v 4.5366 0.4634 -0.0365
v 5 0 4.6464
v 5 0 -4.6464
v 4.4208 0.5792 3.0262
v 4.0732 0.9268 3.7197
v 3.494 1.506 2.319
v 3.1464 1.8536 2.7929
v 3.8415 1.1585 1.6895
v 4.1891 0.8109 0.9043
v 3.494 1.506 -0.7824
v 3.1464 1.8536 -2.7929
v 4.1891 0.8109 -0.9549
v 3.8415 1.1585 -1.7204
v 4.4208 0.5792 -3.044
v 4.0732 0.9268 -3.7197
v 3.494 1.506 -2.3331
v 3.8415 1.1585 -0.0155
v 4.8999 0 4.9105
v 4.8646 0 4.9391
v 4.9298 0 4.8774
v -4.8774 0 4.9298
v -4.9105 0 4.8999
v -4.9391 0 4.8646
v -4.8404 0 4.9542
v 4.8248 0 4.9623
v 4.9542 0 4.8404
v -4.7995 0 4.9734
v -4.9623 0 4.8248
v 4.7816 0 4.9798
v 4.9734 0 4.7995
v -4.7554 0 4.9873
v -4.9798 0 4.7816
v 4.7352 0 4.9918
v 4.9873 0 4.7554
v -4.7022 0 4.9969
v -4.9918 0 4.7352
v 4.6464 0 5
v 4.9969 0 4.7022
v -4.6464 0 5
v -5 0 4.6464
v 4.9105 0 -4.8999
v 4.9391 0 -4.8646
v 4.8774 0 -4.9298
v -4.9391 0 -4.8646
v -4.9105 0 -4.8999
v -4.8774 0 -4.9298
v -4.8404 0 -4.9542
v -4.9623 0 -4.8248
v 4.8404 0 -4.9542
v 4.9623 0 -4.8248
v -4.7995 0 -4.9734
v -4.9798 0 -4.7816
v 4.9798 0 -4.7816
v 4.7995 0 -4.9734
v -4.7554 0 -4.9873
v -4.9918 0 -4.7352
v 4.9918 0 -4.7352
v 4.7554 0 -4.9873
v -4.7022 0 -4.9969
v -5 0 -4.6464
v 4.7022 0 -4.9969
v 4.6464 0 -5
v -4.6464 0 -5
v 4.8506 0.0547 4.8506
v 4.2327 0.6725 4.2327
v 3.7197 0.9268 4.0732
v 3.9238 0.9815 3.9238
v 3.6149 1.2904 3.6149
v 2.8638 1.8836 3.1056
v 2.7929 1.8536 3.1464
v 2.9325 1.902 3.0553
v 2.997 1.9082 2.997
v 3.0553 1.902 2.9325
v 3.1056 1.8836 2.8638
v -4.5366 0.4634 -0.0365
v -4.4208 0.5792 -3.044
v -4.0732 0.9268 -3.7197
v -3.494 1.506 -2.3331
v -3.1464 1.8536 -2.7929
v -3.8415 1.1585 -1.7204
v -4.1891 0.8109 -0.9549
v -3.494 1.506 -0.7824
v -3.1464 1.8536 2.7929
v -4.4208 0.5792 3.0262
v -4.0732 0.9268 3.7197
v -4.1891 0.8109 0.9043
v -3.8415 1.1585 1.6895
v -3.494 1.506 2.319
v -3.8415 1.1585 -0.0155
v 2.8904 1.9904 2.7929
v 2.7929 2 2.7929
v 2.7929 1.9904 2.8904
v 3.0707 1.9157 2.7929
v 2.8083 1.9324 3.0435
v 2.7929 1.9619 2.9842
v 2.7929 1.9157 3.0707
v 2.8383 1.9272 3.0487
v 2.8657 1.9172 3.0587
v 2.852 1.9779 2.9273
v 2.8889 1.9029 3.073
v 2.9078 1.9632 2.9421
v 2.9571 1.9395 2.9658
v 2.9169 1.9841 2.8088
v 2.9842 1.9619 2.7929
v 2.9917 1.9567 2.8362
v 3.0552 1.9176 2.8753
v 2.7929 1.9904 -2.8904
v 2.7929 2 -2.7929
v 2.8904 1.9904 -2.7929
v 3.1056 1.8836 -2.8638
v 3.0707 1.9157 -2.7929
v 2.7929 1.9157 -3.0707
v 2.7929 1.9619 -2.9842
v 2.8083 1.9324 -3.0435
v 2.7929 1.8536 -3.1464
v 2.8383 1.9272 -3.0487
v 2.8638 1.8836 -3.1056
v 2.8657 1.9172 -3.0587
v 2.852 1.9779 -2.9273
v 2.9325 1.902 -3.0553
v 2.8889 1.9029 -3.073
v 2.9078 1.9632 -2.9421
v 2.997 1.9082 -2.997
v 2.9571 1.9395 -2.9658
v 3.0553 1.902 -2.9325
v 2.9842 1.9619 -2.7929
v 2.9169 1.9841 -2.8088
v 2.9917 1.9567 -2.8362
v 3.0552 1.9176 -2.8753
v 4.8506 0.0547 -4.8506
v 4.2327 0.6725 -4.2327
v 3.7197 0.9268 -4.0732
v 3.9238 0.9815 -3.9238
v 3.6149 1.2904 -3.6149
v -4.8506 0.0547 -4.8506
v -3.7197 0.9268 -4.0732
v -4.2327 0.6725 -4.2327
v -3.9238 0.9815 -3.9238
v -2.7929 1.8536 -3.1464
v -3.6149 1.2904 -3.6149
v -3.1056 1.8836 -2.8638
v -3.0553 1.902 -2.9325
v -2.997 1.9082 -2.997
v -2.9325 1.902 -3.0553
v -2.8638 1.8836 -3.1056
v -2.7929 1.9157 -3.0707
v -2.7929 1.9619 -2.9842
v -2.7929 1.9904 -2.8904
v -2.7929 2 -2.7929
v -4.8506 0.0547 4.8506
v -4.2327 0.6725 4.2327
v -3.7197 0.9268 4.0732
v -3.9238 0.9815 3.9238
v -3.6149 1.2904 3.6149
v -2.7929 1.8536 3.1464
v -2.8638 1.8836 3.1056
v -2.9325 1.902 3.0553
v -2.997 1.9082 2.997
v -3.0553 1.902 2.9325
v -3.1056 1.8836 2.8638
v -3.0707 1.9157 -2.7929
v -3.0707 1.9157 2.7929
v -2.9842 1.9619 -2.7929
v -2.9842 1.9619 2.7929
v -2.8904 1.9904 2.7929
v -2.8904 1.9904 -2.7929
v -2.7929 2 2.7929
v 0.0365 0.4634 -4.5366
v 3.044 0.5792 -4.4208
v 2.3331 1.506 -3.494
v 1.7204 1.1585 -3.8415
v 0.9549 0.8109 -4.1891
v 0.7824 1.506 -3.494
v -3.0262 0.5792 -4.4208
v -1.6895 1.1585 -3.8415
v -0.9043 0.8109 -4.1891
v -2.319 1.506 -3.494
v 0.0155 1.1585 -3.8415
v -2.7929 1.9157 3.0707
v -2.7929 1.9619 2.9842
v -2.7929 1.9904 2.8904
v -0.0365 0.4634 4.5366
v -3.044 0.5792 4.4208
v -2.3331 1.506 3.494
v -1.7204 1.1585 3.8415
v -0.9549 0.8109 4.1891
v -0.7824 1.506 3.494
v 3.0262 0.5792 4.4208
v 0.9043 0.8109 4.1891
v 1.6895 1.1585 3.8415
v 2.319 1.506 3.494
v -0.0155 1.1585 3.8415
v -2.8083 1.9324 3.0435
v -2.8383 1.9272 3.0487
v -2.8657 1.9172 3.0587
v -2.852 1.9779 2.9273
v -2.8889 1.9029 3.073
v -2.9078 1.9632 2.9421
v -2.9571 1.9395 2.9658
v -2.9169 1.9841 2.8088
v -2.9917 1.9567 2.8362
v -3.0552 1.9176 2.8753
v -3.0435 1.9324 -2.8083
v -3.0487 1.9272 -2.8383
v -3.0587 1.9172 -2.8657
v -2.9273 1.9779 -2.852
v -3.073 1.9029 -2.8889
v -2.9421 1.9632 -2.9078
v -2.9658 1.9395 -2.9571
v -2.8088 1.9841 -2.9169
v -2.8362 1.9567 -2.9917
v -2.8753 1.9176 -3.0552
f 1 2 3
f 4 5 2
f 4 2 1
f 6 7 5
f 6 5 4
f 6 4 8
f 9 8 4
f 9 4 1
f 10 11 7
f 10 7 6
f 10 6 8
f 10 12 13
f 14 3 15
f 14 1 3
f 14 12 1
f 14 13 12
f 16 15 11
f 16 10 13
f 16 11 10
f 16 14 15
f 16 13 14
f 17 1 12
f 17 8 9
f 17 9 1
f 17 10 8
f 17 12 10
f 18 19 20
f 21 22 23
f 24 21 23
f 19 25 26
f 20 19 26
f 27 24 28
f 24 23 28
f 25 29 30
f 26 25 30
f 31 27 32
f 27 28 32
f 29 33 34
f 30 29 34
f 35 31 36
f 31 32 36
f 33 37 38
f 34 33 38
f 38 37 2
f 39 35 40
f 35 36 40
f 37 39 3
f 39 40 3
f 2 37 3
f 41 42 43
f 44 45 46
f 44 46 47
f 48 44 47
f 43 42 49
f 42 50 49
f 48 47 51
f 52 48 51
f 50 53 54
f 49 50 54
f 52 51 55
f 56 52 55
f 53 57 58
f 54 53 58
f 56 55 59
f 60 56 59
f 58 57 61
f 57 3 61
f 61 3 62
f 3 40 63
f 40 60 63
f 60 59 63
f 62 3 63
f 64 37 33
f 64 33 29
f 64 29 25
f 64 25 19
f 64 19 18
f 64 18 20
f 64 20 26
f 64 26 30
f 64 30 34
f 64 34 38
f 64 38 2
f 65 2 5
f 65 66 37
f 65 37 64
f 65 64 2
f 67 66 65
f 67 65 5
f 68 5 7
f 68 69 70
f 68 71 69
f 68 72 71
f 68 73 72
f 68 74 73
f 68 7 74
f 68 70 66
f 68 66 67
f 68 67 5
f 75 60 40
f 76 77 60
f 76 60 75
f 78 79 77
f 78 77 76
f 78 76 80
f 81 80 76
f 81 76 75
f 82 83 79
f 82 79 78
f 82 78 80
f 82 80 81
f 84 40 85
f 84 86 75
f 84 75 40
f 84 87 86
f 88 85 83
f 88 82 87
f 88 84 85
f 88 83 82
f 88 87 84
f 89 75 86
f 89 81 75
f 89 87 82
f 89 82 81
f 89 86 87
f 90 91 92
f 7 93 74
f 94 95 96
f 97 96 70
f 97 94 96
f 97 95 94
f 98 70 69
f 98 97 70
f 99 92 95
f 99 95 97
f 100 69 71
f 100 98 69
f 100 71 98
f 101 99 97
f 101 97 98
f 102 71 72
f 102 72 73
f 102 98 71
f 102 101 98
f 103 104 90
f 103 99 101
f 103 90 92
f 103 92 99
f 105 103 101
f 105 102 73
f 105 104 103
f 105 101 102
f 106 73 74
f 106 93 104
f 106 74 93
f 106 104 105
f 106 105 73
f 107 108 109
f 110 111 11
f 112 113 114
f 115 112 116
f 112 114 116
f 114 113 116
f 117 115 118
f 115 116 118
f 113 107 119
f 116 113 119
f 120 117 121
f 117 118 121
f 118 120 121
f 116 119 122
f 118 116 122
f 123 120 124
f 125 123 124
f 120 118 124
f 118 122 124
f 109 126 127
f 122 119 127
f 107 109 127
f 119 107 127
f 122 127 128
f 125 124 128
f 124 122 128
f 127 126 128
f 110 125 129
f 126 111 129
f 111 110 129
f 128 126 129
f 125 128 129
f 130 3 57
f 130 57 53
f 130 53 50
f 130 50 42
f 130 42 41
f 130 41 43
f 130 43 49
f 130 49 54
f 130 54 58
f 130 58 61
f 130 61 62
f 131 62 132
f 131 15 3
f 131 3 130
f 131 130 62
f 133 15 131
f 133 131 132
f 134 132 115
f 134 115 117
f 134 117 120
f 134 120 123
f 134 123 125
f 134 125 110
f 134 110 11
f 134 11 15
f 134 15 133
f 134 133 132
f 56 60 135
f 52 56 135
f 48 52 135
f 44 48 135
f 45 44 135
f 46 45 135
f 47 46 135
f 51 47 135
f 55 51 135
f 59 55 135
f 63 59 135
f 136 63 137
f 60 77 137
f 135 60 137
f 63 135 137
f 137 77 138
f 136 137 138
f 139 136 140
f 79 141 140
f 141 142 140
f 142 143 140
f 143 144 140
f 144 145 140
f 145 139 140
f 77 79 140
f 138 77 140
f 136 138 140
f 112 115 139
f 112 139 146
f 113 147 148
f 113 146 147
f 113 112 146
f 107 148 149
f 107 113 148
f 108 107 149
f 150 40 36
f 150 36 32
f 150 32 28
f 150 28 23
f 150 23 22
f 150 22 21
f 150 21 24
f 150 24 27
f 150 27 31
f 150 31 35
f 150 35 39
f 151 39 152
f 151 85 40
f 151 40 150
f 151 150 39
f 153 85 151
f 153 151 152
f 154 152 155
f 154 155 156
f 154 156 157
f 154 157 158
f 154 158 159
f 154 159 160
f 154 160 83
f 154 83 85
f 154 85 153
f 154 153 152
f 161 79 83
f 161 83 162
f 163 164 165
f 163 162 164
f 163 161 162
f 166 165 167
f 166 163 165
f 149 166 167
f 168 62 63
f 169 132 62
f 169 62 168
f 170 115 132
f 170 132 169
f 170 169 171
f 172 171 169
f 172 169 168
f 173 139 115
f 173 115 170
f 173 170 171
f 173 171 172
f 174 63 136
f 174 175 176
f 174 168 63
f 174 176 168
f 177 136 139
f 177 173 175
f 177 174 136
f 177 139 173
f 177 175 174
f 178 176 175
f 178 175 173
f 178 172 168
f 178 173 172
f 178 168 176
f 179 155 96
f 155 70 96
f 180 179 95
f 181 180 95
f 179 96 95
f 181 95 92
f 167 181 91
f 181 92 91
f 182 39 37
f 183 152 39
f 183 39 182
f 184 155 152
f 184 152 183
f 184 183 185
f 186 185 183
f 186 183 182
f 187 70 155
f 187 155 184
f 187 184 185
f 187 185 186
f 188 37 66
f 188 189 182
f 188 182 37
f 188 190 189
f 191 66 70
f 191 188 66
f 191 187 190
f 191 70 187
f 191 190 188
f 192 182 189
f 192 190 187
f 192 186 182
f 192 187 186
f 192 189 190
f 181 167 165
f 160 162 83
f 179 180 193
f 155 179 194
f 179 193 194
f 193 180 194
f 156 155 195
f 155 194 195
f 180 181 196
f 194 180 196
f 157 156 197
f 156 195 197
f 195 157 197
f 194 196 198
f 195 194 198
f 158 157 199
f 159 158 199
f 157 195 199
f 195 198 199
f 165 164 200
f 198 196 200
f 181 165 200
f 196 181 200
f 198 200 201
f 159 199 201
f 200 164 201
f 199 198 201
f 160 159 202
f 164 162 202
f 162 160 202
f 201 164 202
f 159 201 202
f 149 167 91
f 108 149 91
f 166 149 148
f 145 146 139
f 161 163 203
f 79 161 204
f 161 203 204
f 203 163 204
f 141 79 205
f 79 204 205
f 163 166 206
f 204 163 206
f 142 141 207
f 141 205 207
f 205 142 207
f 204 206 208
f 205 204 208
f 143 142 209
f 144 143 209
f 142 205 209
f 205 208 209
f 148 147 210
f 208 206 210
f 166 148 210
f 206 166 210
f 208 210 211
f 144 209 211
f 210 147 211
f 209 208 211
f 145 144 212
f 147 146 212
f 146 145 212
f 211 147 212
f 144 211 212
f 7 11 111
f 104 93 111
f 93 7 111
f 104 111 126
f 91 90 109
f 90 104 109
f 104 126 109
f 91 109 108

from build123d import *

# Parameters (mm, degrees)
CROQUIS1_W              = 10
CROQUIS1_H              = 10
SALIENTE_EXTRUIR1_DEPTH = 2
SALIENTE_EXTRUIR1_TAPER = 45
REDONDEO1_R             = 0.5


with BuildPart() as part:
    # Croquis1 → Saliente-Extruir1 (new body)
    with BuildSketch(Plane(origin=(0, 0, 0), x_dir=(1, 0, 0), z_dir=(0, 1, 0))):
        Rectangle(CROQUIS1_W, CROQUIS1_H)
    extrude(amount=SALIENTE_EXTRUIR1_DEPTH, taper=SALIENTE_EXTRUIR1_TAPER)

    # Redondeo1
    redondeo1_edges = [part.edges().sort_by_distance(p)[0] for p in [
        (3, 2, 0),
        (0, 2, -3),
        (-3, 2, 0),
        (0, 2, 3),
        (-4, 1, -4),
        (4, 1, -4),
        (4, 1, 4),
        (-4, 1, 4),
    ]]
    fillet(redondeo1_edges, radius=REDONDEO1_R)


solid = part.part
